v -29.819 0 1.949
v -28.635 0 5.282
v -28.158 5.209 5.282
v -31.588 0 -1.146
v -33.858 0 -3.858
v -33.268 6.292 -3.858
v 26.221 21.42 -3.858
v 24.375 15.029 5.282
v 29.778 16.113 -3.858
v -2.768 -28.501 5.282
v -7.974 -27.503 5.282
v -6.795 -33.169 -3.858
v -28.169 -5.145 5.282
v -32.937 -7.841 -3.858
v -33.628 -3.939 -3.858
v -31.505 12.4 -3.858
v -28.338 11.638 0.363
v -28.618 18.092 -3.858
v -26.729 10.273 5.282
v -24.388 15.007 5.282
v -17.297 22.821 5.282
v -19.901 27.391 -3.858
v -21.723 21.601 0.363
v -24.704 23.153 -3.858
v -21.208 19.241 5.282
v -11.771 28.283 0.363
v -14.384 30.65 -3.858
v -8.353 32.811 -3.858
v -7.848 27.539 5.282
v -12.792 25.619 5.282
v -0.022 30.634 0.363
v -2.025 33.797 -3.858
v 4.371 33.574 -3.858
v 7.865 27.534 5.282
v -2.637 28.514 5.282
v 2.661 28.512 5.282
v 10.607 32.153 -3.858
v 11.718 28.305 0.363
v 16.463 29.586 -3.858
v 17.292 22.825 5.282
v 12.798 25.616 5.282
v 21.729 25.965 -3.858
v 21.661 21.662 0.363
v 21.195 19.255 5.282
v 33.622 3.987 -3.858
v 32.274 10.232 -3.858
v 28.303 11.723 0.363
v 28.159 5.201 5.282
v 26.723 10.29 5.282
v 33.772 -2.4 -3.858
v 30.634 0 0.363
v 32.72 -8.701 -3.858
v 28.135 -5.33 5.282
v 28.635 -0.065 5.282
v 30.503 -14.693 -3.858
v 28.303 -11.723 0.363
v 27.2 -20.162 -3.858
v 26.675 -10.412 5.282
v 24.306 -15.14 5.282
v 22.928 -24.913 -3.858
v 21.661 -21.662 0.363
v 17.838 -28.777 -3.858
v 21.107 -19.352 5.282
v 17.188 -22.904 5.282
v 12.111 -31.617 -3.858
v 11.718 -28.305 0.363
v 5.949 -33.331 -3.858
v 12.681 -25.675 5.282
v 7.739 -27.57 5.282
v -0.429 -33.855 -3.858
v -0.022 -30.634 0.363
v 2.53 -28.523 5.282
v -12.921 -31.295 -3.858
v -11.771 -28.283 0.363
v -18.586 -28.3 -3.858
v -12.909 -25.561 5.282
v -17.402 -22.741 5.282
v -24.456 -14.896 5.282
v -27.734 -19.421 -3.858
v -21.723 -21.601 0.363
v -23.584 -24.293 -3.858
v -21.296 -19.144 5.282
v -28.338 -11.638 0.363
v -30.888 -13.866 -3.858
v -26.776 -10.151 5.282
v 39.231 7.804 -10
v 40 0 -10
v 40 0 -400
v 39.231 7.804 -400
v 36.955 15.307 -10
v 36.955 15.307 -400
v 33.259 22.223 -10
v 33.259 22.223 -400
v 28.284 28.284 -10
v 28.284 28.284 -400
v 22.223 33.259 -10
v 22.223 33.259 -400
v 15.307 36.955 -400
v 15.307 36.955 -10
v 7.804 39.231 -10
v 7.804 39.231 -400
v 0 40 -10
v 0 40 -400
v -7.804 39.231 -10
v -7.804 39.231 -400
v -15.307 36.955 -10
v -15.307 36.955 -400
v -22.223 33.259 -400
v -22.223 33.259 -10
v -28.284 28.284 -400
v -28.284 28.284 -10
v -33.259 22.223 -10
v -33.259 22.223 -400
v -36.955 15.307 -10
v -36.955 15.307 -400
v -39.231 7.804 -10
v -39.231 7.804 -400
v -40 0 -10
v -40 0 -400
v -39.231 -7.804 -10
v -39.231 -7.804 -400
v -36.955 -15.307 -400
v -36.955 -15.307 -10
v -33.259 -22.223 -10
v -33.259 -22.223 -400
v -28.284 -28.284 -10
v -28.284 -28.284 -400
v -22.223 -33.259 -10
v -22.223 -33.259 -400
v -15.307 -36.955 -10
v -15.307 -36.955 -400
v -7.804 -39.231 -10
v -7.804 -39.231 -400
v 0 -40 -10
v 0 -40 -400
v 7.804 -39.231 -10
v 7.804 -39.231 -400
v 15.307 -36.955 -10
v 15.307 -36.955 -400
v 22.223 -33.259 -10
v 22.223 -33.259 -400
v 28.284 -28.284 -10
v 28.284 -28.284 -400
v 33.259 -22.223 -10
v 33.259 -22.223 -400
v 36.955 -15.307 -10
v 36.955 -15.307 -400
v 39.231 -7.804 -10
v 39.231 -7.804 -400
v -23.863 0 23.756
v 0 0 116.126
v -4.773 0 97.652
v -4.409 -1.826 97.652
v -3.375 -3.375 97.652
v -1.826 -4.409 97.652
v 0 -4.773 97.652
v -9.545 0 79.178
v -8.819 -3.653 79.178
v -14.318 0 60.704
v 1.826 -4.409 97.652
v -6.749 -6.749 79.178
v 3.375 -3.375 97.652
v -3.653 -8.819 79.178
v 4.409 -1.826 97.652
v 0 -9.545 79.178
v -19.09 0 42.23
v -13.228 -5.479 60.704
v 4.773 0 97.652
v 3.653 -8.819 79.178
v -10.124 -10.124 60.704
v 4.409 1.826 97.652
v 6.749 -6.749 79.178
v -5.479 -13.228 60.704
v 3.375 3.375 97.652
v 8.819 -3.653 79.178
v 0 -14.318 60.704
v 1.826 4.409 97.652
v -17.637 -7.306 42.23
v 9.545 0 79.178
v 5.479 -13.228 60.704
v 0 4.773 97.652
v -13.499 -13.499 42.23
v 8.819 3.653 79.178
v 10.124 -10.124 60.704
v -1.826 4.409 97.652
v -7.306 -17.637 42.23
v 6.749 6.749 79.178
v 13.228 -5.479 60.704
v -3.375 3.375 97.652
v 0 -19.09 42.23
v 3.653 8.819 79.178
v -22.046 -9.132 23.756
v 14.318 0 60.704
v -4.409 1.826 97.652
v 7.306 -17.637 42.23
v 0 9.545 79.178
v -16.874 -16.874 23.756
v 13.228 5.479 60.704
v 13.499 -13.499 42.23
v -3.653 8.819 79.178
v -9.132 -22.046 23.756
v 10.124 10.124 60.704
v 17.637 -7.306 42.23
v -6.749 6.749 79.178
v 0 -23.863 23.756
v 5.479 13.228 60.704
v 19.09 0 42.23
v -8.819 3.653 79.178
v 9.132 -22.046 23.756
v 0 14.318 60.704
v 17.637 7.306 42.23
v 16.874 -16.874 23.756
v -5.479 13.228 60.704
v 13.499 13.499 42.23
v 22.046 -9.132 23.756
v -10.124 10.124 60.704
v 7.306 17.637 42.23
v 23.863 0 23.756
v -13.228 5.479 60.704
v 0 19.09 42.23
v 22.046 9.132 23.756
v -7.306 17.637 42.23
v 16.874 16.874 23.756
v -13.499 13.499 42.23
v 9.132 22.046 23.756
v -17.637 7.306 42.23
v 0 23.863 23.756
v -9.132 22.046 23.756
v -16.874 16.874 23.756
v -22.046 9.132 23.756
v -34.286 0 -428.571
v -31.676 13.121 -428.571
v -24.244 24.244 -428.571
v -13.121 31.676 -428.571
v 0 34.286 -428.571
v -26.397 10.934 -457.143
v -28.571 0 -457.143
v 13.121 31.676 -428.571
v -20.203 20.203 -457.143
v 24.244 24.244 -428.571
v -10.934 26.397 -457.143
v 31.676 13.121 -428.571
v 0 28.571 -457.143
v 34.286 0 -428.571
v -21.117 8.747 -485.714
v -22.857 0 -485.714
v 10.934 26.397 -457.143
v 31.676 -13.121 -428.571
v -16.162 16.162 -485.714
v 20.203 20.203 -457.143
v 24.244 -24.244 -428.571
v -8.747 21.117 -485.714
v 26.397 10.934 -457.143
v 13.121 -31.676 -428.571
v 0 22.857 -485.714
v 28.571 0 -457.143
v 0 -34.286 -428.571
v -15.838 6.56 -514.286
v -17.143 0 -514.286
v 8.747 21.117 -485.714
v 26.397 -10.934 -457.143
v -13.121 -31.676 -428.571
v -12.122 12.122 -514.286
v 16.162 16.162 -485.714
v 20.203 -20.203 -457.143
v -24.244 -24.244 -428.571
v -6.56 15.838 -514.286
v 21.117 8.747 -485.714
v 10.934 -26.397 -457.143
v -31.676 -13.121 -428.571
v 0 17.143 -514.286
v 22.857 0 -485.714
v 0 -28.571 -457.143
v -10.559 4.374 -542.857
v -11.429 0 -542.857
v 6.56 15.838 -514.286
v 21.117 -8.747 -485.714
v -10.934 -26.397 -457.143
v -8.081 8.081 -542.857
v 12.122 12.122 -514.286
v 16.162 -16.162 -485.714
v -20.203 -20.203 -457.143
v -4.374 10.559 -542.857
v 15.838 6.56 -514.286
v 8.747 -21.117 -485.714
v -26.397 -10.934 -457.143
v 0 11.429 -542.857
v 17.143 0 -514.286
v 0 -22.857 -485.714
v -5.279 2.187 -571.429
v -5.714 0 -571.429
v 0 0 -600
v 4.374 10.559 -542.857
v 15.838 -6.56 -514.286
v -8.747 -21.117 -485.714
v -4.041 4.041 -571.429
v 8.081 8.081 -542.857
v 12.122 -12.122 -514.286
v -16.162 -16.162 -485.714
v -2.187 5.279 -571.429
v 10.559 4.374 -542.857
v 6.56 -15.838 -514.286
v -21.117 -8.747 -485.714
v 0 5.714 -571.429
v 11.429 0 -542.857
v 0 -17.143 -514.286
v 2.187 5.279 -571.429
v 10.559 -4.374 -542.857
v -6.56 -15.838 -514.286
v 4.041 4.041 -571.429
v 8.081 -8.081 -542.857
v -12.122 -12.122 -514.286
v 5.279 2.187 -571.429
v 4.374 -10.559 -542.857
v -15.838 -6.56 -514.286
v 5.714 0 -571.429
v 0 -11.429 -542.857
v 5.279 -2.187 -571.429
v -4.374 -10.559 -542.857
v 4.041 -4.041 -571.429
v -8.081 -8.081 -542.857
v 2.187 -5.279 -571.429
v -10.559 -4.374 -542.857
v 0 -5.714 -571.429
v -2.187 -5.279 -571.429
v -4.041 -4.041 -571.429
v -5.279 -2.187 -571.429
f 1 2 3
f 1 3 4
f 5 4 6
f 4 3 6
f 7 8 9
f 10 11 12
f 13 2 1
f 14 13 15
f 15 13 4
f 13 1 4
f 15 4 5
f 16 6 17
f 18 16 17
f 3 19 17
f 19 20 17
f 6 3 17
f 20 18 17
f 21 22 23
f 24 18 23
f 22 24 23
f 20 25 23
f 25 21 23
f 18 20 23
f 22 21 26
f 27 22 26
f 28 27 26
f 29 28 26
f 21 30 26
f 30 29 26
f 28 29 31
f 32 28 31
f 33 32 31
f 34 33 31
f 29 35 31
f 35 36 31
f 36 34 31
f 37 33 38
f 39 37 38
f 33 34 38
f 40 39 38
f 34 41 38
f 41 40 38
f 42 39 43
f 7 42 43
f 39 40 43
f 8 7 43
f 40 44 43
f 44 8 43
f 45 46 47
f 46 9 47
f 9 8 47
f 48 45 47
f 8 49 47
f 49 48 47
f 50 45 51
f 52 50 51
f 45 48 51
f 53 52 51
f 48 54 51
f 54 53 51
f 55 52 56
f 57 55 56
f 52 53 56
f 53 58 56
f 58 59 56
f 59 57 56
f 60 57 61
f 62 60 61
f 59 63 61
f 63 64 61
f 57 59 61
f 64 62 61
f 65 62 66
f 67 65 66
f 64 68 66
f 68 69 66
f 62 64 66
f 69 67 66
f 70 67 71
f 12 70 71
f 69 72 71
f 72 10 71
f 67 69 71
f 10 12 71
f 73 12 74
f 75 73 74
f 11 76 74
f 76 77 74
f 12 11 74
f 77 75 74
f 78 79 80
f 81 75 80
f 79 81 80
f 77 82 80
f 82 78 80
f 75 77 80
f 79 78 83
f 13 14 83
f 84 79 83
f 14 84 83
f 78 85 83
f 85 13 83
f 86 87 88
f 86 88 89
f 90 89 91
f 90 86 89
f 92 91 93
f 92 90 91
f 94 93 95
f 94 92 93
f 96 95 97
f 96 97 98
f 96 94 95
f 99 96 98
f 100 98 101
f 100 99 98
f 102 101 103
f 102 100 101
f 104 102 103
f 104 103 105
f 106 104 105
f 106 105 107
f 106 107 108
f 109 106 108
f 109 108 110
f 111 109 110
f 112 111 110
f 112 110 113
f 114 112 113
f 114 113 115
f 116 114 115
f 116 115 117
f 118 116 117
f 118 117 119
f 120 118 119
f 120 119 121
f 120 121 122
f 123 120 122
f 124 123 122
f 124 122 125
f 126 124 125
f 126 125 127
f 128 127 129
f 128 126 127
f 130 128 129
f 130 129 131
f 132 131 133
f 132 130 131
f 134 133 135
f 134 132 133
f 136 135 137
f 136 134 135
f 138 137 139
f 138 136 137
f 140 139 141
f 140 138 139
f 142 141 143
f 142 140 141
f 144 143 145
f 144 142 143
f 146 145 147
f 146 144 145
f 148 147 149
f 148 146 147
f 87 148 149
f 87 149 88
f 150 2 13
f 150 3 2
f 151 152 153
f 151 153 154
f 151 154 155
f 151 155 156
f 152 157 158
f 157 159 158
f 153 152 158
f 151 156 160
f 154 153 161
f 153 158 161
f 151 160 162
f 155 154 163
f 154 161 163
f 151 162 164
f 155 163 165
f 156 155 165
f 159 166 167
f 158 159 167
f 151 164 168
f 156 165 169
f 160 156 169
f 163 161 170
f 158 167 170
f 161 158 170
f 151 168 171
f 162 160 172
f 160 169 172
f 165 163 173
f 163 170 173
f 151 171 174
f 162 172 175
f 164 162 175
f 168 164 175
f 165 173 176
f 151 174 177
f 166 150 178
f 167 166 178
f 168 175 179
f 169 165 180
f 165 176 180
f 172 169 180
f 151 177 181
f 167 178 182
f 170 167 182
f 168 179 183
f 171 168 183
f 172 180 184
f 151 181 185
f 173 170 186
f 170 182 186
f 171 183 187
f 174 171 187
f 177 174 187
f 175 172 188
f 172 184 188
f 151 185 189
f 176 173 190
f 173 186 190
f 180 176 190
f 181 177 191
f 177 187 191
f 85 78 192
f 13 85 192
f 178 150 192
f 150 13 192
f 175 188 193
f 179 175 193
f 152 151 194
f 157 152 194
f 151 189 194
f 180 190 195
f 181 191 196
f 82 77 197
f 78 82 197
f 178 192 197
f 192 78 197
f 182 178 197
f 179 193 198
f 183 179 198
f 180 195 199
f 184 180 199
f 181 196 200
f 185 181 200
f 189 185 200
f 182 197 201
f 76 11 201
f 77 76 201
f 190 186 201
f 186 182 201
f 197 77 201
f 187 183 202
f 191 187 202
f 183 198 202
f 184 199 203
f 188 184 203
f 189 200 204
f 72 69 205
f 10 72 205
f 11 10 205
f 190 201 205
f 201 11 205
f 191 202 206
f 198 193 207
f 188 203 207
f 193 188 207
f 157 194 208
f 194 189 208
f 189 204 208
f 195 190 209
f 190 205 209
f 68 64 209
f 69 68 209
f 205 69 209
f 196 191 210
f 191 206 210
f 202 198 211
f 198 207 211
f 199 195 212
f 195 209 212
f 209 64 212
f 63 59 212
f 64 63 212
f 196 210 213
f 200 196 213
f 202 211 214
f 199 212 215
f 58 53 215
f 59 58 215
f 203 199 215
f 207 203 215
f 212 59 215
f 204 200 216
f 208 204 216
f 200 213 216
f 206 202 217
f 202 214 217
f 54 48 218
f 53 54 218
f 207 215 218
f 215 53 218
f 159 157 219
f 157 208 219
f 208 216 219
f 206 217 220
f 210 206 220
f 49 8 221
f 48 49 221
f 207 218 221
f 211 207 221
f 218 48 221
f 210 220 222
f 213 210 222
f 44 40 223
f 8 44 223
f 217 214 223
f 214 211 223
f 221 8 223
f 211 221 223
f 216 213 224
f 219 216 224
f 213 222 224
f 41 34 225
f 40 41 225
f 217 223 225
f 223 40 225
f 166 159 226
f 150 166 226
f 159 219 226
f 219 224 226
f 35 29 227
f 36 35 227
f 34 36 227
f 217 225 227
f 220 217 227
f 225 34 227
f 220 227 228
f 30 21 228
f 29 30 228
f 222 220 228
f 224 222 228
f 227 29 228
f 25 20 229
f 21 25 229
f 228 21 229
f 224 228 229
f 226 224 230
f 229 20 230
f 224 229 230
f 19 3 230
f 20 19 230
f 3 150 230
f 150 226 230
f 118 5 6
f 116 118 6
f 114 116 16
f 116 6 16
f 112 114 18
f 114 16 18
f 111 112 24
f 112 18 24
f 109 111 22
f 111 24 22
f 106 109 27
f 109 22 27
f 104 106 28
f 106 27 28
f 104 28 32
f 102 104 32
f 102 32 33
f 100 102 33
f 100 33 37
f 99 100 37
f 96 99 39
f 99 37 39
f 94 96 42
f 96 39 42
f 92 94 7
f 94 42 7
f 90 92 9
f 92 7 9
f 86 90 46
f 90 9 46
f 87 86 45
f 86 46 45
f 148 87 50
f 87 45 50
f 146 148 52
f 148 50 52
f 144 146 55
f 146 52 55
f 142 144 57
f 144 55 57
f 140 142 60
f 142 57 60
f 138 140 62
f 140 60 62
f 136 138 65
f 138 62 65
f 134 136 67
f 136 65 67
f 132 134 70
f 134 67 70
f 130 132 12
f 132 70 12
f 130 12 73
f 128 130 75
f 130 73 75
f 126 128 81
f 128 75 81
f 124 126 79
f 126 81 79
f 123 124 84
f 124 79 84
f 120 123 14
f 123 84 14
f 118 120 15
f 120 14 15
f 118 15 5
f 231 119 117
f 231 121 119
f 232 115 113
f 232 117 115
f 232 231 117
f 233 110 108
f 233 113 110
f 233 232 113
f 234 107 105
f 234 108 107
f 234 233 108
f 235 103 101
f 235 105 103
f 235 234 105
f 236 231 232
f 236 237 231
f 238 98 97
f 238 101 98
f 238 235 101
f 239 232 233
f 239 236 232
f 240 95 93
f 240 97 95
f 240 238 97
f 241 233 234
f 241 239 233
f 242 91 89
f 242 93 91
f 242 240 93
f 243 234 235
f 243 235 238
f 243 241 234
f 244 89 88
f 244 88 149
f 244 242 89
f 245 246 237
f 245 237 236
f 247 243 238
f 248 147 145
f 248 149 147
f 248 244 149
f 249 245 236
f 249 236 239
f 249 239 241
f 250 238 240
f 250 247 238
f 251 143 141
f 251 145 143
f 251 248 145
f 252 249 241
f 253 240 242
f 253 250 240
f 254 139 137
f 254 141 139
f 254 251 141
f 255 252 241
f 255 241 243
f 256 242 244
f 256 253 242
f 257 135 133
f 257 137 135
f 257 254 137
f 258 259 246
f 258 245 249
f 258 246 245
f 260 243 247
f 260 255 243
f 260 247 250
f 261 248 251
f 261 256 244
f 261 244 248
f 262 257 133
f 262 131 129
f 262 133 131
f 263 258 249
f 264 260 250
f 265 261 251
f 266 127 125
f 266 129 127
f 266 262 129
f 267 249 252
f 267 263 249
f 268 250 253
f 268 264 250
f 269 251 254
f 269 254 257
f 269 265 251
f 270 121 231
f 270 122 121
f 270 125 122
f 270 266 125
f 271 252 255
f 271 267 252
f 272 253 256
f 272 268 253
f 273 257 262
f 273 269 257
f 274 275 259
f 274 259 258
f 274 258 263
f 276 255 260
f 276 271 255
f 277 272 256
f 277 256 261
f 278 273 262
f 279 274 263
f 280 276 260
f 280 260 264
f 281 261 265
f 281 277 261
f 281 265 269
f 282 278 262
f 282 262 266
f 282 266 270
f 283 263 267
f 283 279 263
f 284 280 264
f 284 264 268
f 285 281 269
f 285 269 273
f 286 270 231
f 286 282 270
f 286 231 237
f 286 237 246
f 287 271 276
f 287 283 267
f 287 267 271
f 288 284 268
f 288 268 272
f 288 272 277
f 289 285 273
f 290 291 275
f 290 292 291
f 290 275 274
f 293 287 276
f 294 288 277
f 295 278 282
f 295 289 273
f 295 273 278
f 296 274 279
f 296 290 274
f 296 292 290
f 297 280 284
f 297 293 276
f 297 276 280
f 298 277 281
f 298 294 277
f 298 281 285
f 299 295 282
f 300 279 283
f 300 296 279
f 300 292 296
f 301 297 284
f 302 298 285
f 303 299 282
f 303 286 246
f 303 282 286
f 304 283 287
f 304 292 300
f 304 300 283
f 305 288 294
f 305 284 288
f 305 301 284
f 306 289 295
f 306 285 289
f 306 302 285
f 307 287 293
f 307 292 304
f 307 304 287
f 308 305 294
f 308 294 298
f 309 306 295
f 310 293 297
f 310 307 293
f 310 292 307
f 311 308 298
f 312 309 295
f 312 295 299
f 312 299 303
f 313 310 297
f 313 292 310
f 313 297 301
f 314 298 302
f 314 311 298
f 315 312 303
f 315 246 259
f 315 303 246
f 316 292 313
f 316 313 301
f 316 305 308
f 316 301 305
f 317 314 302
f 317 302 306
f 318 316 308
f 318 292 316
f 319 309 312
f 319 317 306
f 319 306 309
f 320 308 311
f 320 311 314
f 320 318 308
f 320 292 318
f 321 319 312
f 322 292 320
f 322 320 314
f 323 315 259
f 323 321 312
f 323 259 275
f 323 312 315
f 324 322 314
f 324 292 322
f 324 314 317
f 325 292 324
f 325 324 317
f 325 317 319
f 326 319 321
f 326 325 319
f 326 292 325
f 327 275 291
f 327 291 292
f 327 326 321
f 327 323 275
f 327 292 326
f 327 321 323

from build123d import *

# Parameters (mm, degrees)
F0_R     = 40
F1_DEPTH = 400
F6_R     = 20


with BuildPart() as f1:
    # F0 (on Top) → F1 (new body)
    with BuildSketch(Plane.XY):
        Circle(F0_R)
    extrude(amount=-F1_DEPTH)

    # F2 (on Front) → F3 (revolve, cut)
    with BuildSketch(Plane.XZ):
        Polygon((-40, 0), (-40, -10), (-30, 0), align=None)
    revolve(axis=Axis((0, 0, -3.875099), (0, 0, -1)), mode=Mode.SUBTRACT)

    # F4 (on Front) → F5 (revolve)
    with BuildSketch(Plane.XZ):
        Polygon((-30, 0), (0, 0), (0, 116.126455), align=None)
    revolve(axis=Axis((0, 0, 58.063228), (0, 0, 1)))

    # F6
    f6_edges = [f1.edges().sort_by_distance(p)[0] for p in [
        (30, 0, 0),
    ]]
    fillet(f6_edges, radius=F6_R)

    # F7 (on Front) → F8 (revolve)
    with BuildSketch(Plane.XZ):
        Polygon((0, -400), (-40, -400), (0, -600), align=None)
    revolve(axis=Axis((0, 0, -500), (0, 0, -1)))


solid = f1.part
